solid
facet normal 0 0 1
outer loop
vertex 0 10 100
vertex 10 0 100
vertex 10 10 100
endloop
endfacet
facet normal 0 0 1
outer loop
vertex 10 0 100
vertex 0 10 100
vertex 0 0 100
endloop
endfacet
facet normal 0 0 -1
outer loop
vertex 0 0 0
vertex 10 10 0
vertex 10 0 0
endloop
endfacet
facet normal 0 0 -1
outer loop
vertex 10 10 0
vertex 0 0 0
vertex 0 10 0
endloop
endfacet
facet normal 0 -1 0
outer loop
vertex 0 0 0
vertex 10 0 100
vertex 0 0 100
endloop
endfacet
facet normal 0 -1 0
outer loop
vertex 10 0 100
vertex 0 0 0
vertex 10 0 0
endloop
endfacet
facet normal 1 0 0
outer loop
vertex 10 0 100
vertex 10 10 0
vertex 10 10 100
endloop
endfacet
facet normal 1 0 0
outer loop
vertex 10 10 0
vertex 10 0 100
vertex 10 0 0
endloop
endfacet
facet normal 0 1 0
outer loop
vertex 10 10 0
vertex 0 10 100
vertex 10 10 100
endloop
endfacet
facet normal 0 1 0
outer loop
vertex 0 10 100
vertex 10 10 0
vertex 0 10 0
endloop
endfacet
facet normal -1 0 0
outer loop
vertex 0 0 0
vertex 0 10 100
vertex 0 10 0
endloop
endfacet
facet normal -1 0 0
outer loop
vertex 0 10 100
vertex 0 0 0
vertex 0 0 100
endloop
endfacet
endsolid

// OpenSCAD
$fn = 64;

size = 10.0;     // mm
length = 100.0;  // mm

cube([size, size, length], center = false);
